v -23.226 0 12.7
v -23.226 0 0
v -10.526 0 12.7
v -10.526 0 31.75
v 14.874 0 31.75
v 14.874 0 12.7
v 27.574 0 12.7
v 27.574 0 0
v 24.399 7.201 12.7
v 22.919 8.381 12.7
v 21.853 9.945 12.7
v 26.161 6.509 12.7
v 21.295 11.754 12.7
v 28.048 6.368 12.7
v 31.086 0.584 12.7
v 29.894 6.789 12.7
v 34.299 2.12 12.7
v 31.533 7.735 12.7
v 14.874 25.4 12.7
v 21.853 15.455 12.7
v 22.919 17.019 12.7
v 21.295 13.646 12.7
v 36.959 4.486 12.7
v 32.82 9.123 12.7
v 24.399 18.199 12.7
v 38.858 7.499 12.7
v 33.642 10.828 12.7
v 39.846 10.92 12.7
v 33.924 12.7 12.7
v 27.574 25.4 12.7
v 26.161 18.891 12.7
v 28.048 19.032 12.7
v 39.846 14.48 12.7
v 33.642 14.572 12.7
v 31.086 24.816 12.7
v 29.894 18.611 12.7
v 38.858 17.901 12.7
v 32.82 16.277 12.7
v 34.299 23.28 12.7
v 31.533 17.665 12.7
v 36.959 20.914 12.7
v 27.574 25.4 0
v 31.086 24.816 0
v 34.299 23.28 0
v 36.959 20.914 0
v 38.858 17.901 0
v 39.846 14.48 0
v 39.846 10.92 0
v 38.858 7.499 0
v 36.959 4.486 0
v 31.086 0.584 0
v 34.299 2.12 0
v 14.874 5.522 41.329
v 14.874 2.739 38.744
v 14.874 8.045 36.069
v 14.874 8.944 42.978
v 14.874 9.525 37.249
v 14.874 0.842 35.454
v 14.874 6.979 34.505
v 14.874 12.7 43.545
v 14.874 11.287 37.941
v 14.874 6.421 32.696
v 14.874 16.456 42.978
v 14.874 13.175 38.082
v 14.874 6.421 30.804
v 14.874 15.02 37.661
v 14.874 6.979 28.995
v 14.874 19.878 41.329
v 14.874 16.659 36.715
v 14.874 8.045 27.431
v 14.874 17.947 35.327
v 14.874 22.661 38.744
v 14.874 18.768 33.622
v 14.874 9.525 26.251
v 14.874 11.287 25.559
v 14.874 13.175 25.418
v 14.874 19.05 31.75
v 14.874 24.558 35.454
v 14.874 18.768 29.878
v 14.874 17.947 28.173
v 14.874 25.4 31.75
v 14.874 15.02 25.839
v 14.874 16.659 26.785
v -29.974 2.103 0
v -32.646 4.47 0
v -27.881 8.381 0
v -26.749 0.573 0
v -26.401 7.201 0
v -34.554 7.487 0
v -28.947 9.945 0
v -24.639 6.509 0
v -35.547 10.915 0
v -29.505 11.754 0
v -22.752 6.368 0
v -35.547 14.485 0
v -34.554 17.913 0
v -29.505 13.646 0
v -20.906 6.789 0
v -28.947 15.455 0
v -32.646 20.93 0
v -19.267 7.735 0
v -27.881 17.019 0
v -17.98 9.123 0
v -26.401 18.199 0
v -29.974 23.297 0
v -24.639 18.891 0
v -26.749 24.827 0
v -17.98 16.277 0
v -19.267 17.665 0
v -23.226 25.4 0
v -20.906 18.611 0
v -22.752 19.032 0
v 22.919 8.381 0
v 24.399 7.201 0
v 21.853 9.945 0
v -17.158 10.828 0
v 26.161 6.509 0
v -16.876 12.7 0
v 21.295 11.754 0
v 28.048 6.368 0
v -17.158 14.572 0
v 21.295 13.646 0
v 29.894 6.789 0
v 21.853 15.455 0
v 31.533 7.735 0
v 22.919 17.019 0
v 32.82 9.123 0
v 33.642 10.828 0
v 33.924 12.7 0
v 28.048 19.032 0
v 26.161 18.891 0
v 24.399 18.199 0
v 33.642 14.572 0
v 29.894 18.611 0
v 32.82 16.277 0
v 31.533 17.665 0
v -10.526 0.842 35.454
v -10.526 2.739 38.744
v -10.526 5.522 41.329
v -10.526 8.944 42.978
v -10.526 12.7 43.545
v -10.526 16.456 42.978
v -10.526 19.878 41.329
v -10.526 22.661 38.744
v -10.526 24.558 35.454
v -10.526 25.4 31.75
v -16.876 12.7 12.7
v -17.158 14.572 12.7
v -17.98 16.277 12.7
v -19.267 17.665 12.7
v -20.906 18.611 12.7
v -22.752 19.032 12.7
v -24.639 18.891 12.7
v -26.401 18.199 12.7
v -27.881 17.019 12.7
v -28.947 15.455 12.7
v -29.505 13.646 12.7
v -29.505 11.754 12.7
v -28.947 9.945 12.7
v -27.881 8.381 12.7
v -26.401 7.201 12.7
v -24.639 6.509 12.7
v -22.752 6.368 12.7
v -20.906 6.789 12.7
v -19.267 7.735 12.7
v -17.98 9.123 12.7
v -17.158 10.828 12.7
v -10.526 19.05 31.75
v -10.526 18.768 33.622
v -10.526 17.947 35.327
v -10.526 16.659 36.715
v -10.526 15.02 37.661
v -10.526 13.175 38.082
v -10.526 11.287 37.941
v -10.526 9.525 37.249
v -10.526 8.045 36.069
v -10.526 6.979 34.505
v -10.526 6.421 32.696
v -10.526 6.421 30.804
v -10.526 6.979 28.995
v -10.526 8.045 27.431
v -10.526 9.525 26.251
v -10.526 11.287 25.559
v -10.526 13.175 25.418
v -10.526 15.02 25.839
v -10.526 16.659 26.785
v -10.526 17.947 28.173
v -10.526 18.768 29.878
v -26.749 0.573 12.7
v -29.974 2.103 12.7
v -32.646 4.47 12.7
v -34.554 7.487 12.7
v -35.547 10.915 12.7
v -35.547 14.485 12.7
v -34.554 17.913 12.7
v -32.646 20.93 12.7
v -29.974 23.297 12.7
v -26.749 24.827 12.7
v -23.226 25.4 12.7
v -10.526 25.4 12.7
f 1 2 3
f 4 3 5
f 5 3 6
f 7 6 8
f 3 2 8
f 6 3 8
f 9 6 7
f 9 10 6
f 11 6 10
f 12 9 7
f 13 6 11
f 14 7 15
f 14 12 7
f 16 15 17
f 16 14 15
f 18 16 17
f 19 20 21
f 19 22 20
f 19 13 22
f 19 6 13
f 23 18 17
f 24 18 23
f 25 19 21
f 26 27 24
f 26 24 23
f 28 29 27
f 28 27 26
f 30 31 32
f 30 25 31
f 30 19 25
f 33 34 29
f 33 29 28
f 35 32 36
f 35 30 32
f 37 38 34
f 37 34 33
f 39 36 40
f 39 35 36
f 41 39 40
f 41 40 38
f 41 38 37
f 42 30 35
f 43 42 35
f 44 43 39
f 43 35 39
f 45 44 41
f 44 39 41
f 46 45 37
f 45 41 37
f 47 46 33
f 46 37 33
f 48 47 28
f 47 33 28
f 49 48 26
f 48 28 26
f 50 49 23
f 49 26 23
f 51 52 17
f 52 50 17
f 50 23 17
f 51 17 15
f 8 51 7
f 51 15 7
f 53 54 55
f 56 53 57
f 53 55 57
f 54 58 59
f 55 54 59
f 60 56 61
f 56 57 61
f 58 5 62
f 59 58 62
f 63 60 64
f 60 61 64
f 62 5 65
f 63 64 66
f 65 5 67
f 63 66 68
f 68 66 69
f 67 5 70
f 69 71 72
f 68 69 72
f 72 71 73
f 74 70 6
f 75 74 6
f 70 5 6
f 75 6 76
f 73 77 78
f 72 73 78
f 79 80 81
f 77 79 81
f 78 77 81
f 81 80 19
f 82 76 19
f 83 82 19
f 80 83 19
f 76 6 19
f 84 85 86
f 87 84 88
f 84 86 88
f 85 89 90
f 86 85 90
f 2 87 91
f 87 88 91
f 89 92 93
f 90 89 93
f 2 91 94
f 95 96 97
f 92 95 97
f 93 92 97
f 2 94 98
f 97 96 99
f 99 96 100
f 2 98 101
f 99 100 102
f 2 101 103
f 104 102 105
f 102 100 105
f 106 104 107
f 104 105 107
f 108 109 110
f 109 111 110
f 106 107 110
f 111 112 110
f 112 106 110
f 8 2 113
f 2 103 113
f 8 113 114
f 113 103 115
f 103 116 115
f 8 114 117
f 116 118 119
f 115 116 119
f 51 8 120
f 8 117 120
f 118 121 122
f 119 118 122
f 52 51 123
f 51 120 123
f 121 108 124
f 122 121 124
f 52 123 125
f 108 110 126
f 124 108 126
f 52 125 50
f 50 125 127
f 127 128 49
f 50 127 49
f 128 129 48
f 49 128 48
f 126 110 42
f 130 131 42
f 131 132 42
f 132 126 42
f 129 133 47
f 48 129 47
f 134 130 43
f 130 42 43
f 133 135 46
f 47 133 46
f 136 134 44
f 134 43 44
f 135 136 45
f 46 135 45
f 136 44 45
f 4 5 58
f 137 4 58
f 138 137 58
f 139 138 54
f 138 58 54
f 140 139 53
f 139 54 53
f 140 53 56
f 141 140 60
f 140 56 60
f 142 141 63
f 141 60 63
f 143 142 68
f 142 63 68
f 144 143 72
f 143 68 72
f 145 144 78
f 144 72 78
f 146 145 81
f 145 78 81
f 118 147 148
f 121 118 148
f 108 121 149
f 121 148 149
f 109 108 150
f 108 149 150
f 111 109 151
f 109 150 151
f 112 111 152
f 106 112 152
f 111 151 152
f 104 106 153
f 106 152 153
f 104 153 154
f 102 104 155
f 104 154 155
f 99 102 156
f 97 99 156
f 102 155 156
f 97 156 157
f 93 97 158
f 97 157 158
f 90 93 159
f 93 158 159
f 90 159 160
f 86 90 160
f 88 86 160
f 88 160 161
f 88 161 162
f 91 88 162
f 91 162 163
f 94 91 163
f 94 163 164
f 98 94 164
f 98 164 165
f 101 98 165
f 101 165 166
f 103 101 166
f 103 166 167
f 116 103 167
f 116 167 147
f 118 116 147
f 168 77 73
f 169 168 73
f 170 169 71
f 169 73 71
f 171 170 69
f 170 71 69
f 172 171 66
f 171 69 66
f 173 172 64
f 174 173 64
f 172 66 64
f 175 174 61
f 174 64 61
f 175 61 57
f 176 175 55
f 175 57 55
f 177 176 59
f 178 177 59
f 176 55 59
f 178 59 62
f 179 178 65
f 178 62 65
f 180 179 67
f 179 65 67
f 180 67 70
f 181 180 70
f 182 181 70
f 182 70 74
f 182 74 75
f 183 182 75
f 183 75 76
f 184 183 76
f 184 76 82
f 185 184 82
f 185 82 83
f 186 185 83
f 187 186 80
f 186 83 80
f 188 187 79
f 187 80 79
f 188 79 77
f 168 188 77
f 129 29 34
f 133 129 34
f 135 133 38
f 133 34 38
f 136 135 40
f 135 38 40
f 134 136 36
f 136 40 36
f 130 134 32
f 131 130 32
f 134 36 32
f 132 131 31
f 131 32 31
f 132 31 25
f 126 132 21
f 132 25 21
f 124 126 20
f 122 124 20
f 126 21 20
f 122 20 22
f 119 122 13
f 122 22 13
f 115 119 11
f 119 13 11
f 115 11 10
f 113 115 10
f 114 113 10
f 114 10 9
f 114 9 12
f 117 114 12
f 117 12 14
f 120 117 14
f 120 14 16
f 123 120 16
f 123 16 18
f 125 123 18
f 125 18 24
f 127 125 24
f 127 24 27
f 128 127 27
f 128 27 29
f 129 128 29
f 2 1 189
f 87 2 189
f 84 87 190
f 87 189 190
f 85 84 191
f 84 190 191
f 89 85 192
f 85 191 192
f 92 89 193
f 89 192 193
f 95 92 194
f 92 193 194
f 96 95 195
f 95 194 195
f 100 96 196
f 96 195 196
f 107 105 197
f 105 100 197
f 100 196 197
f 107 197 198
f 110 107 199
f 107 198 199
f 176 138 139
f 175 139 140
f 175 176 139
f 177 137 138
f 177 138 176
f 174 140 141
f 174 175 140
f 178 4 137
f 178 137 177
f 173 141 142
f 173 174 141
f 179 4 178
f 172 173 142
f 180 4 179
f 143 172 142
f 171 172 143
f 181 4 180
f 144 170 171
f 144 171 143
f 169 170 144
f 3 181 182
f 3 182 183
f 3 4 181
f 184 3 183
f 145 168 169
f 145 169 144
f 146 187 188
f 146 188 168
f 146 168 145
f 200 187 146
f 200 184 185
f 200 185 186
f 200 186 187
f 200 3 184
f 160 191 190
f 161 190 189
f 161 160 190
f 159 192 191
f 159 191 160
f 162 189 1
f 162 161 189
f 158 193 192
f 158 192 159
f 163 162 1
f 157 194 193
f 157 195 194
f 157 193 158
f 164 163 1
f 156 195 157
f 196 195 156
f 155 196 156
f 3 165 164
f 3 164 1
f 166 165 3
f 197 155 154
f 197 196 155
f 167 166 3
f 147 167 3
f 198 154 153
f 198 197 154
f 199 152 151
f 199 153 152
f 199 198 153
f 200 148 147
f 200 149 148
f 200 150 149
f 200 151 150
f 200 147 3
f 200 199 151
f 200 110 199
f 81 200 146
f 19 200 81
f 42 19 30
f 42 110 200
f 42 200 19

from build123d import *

# Parameters (mm, degrees)
F0_W      = 76.2
F0_H      = 25.4
F1_DEPTH  = 12.7
F2_R      = 6.35
F3_DEPTH  = 25.4
F4_W      = 25.4
F4_H      = 25.4
F5_DEPTH  = 31.75
F7_DEPTH  = 25.4
F9_DEPTH  = 25.4
F10_R     = 6.35
F11_DEPTH = 25.4
F13_DEPTH = 25.4


with BuildPart() as f1:
    # F0 (on Top) → F1 (new body)
    with BuildSketch(Plane.XY):
        with Locations((2.1738717566, 12.7)):
            Rectangle(F0_W, F0_H)
    extrude(amount=F1_DEPTH)

    # F2 (on face) → F3 (cut)
    with BuildSketch(Plane.XY.offset(12.7)):
        with Locations((-23.2261282434, 12.7)):
            Circle(F2_R)
        with Locations((27.5738717566, 12.7)):
            Circle(F2_R)
    extrude(amount=-F3_DEPTH, mode=Mode.SUBTRACT)

    # F4 (on face) → F5 (join)
    with BuildSketch(Plane.XY.offset(12.7)):
        with Locations((2.1738717566, 12.7)):
            Rectangle(F4_W, F4_H)
    extrude(amount=F5_DEPTH)

    # F6 (on face) → F7 (cut)
    with BuildSketch(Plane.XY.offset(12.7)):
        with BuildLine():
            ThreePointArc((27.5738717566, 25.4), (39.9715783926, 12.7), (27.5738717566, 0))
            Line((27.5738717566, 0), (40.2738717566, 0))
            Line((40.2738717566, 0), (40.2738717566, 25.4))
            Line((40.2738717566, 25.4), (27.5738717566, 25.4))
        make_face()
    extrude(amount=-F7_DEPTH, mode=Mode.SUBTRACT)

    # F8 (on face) → F9 (cut)
    with BuildSketch(Plane.XY.offset(12.7)):
        with BuildLine():
            ThreePointArc((-23.2261282434, 0), (-35.6730291754, 12.7), (-23.2261282434, 25.4))
            Line((-23.2261282434, 25.4), (-35.9261282434, 25.4))
            Line((-35.9261282434, 25.4), (-35.9261282434, 0))
            Line((-35.9261282434, 0), (-23.2261282434, 0))
        make_face()
    extrude(amount=-F9_DEPTH, mode=Mode.SUBTRACT)

    # F10 (on face) → F11 (cut)
    with BuildSketch(Plane.YZ.offset(14.8738717566)):
        with Locations((12.7, 31.75)):
            Circle(F10_R)
    extrude(amount=-F11_DEPTH, mode=Mode.SUBTRACT)

    # F12 (on face) → F13 (cut)
    with BuildSketch(Plane.YZ.offset(14.8738717566)):
        with BuildLine():
            ThreePointArc((0, 31.75), (12.7, 43.5445759726), (25.4, 31.75))
            Line((25.4, 31.75), (25.4, 44.45))
            Line((25.4, 44.45), (0, 44.45))
            Line((0, 44.45), (0, 31.75))
        make_face()
    extrude(amount=-F13_DEPTH, mode=Mode.SUBTRACT)


solid = f1.part
